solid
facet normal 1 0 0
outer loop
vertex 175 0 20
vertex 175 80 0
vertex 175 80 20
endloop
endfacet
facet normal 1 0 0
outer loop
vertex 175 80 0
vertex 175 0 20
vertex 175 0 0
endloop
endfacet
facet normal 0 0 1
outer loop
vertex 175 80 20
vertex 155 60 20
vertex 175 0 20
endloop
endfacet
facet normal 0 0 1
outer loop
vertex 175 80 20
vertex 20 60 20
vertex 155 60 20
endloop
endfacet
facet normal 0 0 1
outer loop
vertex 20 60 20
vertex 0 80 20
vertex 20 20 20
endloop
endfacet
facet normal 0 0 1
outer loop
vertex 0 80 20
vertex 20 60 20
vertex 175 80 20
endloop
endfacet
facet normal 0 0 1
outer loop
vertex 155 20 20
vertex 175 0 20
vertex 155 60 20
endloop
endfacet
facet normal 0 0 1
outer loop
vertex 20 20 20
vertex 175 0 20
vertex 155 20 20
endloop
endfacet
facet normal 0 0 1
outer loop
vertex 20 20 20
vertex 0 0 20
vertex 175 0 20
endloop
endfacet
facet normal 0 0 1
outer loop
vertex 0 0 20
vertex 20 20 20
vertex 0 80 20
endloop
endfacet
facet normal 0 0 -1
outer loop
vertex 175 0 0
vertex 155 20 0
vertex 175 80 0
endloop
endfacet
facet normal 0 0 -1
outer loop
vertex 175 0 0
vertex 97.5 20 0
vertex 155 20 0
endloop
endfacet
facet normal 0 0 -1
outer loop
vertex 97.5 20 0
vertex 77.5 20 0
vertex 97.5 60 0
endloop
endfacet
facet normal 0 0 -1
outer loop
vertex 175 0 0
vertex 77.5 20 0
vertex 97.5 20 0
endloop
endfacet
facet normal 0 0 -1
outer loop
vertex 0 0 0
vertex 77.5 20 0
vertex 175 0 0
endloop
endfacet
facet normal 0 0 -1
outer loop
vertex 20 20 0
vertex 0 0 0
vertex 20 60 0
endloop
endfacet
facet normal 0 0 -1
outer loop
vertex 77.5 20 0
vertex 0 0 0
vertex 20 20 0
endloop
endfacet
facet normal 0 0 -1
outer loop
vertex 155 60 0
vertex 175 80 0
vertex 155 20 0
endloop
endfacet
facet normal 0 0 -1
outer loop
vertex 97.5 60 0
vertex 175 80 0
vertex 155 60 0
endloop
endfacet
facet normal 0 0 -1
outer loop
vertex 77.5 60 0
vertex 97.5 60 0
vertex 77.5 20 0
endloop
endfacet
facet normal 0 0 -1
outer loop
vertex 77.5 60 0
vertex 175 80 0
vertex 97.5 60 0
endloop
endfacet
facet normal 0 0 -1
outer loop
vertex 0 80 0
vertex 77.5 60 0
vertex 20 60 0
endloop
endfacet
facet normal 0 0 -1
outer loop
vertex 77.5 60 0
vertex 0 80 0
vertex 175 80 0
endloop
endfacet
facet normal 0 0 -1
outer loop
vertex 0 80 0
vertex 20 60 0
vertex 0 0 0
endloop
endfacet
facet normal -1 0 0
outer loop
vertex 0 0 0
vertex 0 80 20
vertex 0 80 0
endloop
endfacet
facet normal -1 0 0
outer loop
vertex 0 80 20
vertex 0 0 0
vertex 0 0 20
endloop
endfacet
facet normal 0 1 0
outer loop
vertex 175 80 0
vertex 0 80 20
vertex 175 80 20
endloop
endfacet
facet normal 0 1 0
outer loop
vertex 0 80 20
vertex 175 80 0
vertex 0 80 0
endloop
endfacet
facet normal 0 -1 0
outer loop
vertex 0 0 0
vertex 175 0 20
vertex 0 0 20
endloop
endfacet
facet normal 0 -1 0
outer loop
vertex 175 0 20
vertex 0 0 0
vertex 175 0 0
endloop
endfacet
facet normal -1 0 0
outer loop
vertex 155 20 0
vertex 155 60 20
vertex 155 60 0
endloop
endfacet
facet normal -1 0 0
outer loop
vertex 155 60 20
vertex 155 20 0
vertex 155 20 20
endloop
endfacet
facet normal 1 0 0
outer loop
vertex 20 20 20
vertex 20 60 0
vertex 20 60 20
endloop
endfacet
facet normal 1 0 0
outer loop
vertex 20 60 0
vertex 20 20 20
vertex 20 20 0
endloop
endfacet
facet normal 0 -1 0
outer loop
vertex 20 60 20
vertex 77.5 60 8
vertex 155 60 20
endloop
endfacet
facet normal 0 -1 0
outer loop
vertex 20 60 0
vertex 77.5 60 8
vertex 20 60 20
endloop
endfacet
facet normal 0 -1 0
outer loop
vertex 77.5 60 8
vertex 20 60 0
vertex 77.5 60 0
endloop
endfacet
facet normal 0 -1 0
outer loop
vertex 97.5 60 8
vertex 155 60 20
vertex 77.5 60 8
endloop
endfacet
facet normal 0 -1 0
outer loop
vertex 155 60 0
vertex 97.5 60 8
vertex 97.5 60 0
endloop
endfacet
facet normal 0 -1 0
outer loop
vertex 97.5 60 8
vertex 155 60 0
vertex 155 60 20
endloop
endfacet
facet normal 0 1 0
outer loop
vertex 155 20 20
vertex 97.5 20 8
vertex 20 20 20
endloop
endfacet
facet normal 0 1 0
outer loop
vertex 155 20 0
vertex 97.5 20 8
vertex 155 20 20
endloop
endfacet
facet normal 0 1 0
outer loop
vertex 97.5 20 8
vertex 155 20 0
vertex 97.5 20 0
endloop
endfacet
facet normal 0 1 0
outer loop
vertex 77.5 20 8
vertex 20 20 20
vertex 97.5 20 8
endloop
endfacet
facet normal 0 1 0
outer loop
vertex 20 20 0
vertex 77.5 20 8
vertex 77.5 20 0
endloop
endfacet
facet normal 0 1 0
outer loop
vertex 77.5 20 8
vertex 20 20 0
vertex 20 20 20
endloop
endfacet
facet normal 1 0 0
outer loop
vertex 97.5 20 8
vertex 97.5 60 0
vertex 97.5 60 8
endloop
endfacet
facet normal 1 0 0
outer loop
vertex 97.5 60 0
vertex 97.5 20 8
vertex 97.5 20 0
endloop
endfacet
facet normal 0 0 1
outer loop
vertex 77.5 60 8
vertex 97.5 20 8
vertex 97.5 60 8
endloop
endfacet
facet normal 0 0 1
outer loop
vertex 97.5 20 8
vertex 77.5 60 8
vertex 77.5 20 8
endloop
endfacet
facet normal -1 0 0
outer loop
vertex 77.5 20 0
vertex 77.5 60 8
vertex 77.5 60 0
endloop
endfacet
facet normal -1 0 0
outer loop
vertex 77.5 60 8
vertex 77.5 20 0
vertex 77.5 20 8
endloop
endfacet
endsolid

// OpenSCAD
v = 20;
perem = 20;
marando_sz = 195;
marando_h = 57;

// Számítógép asztal nagyobb téglalap lyukhoz
//sablon(20, 20, 195, 57);

// Számítógép asztal nagyobb téglalap lyukhoz
sablon(20,20, 135, 40);
module sablon(v, perem, marando_sz, marando_h){
    difference(){
        cube([marando_sz+2*perem, marando_h+2*perem, v]);
        translate([perem, perem, -0.1])cube([marando_sz, marando_h, v+0.2]);
    }
    translate([v/2+marando_sz/2,v,0])cube([v, marando_h,8]);
}
